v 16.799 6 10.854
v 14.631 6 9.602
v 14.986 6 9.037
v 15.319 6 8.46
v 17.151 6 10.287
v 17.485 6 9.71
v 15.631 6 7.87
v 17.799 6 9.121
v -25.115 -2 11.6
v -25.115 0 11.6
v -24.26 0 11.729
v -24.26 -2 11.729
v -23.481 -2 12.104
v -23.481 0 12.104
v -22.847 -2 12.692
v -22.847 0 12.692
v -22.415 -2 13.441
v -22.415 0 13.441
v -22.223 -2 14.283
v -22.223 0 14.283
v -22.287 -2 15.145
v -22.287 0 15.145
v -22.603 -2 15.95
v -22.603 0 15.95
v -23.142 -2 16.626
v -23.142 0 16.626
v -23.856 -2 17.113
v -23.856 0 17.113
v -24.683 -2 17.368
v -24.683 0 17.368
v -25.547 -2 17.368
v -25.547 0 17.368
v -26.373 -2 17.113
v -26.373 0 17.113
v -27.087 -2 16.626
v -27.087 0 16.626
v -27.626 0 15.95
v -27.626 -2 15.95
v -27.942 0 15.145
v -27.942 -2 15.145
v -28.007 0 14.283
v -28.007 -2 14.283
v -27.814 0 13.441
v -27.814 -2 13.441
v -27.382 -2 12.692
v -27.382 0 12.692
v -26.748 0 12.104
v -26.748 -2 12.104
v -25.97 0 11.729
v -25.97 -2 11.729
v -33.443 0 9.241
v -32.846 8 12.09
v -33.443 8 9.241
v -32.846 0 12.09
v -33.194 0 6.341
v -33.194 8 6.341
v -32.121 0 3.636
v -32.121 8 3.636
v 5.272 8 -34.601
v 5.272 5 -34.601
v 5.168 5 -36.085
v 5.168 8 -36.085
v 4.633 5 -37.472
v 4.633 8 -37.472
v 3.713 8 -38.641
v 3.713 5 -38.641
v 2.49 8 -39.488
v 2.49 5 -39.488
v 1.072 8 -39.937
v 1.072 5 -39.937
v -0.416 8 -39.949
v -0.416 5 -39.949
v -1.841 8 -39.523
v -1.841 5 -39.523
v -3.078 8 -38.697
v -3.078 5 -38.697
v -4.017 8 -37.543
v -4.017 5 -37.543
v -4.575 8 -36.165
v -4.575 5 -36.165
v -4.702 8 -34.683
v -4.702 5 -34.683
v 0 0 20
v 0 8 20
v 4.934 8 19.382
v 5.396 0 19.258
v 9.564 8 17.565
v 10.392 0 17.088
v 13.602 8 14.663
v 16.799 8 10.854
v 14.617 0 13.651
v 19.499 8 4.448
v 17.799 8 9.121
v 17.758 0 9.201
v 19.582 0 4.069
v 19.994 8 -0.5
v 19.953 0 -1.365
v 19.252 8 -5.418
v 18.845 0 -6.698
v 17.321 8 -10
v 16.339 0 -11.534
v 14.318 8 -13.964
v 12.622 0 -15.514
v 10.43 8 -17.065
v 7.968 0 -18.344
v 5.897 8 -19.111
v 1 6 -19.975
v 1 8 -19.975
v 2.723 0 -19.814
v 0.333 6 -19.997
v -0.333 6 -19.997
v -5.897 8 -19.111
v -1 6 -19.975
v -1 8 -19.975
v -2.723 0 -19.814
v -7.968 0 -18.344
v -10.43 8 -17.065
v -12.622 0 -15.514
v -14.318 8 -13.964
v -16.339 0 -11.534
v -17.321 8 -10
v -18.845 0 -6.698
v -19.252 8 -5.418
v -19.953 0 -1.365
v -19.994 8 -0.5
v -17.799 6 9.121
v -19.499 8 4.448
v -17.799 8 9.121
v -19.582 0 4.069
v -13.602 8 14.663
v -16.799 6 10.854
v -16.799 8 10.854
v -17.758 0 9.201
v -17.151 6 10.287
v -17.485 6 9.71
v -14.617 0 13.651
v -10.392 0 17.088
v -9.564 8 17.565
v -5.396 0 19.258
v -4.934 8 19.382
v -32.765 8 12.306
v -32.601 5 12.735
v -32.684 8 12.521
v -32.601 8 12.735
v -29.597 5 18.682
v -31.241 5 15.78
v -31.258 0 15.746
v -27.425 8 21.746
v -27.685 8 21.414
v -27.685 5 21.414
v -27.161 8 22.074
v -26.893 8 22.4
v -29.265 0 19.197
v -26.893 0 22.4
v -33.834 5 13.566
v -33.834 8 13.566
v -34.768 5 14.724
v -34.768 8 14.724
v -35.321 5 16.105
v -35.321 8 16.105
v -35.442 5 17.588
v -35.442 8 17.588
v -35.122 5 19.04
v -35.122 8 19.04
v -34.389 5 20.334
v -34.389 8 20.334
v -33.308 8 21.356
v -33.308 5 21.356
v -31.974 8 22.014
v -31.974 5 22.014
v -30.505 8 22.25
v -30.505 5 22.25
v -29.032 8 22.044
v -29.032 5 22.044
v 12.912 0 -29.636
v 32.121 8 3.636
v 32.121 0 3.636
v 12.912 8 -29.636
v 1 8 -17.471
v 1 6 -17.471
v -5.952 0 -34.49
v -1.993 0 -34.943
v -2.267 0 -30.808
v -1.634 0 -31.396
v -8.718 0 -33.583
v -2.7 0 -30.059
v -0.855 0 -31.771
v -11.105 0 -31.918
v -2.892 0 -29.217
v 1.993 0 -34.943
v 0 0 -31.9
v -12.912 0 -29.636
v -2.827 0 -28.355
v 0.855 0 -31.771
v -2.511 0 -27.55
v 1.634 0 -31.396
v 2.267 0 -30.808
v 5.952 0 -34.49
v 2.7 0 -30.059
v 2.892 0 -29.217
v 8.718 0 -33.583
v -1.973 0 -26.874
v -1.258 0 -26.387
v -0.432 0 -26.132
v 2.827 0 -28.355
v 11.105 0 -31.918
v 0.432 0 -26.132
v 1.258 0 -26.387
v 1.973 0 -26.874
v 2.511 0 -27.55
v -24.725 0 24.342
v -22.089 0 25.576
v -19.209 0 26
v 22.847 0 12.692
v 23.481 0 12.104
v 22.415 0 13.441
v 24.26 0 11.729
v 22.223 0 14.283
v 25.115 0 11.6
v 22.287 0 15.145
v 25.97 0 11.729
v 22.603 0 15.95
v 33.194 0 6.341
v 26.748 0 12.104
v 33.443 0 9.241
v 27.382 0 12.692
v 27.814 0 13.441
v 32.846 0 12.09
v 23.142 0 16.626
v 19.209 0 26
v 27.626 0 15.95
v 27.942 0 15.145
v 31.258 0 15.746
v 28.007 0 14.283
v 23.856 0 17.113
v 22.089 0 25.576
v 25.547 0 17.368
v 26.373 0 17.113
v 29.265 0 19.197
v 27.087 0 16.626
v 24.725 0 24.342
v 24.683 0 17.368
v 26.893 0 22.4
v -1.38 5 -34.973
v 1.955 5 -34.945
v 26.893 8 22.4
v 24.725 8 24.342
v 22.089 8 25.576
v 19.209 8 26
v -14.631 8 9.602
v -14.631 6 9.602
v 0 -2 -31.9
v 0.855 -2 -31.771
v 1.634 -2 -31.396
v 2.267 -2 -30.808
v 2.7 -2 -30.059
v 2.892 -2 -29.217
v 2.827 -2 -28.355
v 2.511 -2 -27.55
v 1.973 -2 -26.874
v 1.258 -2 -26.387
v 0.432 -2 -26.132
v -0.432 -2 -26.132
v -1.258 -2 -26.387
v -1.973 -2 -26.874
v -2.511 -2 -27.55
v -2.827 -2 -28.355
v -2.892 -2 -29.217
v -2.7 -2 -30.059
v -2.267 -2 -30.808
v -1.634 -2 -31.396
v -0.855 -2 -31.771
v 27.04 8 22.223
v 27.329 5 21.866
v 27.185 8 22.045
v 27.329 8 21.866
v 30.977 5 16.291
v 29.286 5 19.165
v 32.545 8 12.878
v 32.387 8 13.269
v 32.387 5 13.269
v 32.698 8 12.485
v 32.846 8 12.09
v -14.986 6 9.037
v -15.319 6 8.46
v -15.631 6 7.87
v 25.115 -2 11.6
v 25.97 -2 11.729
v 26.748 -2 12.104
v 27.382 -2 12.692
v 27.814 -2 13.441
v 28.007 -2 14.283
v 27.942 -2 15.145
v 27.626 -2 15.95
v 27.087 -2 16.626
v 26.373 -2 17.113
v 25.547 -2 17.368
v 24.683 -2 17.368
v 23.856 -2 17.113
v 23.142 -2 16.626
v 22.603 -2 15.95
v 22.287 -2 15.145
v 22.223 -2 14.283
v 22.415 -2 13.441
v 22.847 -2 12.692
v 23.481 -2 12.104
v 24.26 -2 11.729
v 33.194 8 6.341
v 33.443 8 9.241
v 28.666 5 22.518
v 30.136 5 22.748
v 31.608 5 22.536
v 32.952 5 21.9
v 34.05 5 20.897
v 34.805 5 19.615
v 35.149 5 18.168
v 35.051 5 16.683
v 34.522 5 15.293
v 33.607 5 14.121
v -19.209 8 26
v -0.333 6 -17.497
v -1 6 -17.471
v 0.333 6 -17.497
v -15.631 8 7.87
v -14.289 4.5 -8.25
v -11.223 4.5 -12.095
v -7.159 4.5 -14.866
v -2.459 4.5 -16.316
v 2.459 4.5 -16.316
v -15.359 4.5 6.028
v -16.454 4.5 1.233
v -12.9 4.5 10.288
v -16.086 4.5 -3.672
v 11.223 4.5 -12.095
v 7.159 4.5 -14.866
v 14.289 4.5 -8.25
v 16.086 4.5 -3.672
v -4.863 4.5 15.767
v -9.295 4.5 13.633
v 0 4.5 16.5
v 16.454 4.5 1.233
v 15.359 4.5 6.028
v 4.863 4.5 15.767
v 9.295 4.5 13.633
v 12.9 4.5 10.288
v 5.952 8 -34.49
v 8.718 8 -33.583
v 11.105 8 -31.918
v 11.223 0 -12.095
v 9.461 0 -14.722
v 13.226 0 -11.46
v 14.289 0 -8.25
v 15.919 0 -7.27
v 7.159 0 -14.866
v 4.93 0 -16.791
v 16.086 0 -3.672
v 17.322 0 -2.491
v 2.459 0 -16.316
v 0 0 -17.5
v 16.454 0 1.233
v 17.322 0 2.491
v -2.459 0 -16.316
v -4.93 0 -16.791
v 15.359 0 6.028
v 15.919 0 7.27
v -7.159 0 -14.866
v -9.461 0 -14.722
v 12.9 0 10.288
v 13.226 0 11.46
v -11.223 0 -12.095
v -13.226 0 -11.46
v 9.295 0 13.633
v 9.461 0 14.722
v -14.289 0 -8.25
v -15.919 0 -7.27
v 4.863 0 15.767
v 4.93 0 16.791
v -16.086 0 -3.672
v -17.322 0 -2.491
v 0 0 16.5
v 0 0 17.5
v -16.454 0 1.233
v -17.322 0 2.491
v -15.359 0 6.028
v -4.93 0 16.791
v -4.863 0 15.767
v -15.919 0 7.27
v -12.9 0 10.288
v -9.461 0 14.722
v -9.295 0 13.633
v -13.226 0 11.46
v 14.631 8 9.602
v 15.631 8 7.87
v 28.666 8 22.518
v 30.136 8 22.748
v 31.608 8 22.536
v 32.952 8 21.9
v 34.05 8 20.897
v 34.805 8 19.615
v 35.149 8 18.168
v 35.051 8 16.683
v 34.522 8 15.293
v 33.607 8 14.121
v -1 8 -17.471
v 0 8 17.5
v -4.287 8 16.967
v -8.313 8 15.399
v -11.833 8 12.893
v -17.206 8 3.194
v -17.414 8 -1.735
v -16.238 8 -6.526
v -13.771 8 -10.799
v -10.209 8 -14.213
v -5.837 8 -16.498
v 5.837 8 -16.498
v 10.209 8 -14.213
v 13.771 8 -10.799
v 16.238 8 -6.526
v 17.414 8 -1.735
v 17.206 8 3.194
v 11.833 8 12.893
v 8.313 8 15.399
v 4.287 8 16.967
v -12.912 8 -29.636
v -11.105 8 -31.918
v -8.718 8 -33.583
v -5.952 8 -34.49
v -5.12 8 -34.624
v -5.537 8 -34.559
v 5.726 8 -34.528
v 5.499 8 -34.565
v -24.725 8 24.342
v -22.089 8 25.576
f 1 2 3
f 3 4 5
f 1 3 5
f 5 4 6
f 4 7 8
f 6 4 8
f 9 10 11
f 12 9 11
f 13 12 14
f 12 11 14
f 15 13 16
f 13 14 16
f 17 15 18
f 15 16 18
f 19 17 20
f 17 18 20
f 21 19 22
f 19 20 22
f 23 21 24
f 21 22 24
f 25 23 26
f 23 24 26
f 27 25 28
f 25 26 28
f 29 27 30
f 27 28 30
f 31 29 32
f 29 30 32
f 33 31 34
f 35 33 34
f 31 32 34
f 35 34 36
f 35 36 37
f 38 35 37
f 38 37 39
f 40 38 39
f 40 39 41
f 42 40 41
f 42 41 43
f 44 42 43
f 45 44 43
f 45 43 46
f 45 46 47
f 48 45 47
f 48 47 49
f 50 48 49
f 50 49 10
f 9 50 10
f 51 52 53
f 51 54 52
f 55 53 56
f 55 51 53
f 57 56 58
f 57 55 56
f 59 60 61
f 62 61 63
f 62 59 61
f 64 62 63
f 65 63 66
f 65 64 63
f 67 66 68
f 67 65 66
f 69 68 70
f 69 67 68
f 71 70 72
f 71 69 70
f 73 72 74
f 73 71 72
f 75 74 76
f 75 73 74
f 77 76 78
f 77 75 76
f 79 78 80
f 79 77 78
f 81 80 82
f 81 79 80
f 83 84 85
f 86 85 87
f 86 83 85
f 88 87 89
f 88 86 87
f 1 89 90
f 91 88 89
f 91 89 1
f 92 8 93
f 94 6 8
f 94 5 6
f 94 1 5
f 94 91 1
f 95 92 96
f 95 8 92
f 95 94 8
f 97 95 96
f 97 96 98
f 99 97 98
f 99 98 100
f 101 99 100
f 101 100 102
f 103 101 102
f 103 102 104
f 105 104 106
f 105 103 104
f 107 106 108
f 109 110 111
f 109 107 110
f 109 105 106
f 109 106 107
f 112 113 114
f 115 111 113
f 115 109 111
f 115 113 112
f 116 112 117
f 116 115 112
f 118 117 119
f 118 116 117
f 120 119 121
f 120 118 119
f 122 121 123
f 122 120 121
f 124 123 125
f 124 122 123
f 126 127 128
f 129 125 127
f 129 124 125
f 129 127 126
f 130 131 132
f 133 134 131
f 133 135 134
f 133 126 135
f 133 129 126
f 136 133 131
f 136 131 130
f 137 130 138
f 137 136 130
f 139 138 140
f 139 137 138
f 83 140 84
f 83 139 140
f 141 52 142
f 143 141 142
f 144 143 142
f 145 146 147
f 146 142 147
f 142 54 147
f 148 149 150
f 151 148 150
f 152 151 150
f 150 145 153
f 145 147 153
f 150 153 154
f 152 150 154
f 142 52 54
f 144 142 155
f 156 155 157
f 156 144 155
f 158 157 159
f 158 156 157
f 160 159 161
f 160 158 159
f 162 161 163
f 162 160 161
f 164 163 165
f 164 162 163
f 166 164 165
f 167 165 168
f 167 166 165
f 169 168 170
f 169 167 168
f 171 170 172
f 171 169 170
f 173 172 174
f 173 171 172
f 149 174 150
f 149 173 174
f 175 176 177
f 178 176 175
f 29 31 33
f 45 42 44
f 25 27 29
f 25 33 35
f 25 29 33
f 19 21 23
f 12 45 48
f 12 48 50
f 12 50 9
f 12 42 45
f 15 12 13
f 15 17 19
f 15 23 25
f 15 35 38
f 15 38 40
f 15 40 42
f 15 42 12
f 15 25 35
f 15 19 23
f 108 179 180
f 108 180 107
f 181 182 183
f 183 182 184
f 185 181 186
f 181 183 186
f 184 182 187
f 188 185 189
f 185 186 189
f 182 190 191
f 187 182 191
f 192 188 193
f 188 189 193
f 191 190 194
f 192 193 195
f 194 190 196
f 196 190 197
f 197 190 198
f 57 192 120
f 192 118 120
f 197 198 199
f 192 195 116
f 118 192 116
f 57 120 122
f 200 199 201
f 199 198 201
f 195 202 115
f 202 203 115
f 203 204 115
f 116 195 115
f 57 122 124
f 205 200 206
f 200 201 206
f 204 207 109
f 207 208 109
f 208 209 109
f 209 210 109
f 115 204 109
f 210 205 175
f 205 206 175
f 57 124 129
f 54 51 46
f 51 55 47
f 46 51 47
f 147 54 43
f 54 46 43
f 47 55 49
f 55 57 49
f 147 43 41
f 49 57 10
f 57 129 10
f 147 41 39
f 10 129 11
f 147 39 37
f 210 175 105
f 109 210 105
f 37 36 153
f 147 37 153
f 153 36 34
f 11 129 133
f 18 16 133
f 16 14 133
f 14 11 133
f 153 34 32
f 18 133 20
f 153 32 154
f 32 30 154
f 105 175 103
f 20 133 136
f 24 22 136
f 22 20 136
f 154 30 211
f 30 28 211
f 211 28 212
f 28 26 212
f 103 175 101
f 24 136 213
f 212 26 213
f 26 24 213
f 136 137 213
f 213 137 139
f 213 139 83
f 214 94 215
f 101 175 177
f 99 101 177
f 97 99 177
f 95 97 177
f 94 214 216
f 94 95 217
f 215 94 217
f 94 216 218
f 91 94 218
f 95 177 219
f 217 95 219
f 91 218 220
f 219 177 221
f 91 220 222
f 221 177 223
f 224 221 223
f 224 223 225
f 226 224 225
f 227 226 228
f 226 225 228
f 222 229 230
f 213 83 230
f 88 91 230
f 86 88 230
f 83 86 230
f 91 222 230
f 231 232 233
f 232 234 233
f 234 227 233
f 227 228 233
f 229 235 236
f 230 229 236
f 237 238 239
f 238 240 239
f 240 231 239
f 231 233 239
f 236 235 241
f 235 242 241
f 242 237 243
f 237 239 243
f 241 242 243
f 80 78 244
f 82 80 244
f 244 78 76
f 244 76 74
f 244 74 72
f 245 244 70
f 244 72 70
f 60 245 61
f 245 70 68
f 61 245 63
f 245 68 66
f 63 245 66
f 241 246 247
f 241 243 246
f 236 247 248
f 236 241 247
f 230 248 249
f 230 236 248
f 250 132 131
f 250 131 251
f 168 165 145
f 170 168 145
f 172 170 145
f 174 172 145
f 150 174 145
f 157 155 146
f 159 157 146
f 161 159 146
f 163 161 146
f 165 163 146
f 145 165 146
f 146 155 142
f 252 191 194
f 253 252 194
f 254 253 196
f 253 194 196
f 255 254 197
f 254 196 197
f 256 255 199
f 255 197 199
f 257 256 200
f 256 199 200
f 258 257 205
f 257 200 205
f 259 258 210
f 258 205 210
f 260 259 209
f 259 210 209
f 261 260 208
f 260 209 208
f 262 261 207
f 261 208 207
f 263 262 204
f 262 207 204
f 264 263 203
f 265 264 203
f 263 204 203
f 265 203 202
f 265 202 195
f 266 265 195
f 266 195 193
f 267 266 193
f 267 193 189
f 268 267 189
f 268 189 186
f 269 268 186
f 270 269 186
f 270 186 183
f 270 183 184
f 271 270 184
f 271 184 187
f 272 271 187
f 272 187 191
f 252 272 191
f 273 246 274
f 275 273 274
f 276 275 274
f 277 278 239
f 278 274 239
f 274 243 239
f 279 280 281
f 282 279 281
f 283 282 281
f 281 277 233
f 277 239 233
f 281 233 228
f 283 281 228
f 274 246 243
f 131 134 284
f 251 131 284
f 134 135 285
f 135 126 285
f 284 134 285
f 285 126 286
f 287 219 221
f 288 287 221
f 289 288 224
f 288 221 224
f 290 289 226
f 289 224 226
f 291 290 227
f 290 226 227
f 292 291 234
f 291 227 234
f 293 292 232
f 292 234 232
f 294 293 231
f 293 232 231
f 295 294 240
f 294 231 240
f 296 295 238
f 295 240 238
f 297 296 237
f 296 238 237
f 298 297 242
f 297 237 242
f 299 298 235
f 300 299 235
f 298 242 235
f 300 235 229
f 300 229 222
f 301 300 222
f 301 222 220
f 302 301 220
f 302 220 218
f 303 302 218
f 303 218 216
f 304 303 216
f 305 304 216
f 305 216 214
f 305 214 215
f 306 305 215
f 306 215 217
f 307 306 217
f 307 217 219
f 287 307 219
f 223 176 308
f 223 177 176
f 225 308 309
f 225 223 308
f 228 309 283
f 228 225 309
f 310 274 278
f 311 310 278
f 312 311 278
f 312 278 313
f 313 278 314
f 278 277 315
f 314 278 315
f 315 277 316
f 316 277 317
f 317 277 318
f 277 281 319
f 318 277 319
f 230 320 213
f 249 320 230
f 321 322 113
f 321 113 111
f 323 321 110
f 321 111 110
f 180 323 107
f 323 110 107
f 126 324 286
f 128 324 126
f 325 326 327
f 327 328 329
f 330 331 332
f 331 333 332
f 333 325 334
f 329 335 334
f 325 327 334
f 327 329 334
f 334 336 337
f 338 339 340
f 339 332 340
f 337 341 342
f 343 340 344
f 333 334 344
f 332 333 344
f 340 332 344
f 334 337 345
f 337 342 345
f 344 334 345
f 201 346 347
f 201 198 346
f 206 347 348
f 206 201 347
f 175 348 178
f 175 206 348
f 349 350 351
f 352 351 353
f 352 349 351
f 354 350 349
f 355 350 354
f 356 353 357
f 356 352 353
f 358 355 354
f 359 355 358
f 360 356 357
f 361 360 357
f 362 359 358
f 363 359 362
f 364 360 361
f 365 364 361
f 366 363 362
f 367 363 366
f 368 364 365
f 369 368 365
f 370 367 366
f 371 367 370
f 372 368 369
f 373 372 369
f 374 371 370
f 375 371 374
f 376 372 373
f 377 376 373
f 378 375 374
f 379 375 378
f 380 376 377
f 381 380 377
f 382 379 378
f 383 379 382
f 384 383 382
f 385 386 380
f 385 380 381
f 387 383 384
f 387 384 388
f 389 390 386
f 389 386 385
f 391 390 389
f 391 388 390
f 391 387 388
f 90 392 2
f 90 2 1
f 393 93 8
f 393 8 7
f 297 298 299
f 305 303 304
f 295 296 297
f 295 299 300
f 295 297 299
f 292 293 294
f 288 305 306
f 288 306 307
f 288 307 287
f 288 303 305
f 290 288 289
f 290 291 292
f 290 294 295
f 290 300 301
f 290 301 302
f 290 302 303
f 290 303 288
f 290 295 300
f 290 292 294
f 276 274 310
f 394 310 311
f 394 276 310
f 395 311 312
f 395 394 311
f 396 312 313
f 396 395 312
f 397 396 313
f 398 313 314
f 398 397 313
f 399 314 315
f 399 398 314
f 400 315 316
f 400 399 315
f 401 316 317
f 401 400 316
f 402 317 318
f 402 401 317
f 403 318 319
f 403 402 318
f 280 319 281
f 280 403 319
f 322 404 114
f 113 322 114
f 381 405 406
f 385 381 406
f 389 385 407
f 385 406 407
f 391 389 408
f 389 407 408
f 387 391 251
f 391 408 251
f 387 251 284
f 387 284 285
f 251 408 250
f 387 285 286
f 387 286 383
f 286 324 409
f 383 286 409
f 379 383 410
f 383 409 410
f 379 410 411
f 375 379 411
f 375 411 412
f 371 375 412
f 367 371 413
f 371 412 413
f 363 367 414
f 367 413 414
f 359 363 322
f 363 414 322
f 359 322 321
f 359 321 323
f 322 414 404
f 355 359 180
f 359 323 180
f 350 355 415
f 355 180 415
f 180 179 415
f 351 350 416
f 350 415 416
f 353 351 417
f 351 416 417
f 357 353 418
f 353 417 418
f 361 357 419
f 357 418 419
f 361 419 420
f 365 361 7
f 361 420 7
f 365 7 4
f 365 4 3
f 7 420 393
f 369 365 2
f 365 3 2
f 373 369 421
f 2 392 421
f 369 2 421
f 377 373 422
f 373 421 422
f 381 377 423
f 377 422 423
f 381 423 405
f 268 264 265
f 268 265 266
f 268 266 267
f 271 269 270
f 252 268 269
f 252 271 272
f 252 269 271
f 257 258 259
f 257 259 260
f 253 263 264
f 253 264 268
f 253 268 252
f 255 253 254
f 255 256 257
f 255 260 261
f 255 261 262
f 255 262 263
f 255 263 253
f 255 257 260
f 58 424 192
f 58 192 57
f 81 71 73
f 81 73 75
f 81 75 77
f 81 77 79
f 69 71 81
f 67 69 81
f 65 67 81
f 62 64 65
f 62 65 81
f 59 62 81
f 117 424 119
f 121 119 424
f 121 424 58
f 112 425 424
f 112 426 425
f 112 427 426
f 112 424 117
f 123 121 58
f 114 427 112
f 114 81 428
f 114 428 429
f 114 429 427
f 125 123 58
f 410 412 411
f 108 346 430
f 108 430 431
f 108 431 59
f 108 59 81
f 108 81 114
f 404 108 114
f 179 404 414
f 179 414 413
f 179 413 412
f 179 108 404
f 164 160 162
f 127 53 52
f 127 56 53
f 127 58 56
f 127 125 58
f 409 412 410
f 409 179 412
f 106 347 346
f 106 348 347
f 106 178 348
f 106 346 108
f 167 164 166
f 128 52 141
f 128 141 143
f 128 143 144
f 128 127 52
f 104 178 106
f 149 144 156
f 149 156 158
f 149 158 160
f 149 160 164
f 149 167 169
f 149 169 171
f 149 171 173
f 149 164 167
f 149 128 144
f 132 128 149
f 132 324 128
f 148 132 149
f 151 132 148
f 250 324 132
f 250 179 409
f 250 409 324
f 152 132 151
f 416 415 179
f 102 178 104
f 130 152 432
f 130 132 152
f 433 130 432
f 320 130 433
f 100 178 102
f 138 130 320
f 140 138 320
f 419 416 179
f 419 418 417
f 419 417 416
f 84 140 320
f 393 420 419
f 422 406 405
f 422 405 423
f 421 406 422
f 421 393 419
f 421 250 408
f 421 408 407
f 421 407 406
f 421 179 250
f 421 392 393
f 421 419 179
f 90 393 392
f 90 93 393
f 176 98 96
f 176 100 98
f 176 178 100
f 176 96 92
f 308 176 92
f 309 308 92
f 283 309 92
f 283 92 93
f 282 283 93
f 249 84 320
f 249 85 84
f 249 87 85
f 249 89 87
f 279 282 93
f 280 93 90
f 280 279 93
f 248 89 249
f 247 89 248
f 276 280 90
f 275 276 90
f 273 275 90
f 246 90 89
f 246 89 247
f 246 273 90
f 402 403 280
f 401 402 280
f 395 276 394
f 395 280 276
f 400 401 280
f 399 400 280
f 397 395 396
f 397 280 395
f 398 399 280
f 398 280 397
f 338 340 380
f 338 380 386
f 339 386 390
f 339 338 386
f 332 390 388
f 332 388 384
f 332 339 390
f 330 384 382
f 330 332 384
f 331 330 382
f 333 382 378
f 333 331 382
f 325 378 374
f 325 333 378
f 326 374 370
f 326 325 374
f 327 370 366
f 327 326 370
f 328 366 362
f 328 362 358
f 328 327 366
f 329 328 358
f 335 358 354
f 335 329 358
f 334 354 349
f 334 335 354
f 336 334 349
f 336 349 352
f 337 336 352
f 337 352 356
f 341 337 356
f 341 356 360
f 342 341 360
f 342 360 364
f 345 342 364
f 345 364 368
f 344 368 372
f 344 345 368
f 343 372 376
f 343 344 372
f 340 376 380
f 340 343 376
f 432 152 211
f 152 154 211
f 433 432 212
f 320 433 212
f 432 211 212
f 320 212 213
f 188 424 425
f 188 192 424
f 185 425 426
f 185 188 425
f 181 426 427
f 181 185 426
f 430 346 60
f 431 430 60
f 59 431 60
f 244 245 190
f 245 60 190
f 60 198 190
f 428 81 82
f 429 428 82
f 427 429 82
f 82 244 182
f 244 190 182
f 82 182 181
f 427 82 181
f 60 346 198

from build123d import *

# Parameters (mm, degrees)
SKETCH1_R                = 20
BOSS_EXTRUDE1_DEPTH      = 3.5
SKETCH2_R                = 35
SKETCH2_R_2              = 20
SKETCH2_R_3              = 2.8
BOSS_EXTRUDE2_DEPTH      = 8
BOSS_EXTRUDE3_DEPTH      = 2
BOSS_EXTRUDE3_DEPTH_BACK = 8
SKETCH4_R                = 2.9
SKETCH5_R                = 5
BOSS_EXTRUDE4_DEPTH      = 3
CUT_EXTRUDE1_START       = -10
SKETCH3_R                = 20
CUT_EXTRUDE1_DEPTH       = 10
SKETCH9_R                = 17.5
BOSS_EXTRUDE5_DEPTH      = 3.5
SKETCH10_R               = 17.5
SKETCH10_R_2             = 16.5
BOSS_EXTRUDE6_DEPTH      = 4.5
SKETCH11_W               = 2
SKETCH11_H               = 6.599117057
BOSS_EXTRUDE7_DEPTH      = 2
SKETCH12_R               = 72.135852014
CUT_EXTRUDE2_DEPTH       = 22
FILLET1_R                = 10


with BuildPart() as part:
    # Sketch1 → Boss-Extrude1 (new body)
    with BuildSketch(Plane(origin=(0, 0, 0), x_dir=(1, 0, 0), z_dir=(0, 1, 0))):
        with Locations(Location((0, 0, 0), (0, 0, 270))):
            Circle(SKETCH1_R)
    extrude(amount=BOSS_EXTRUDE1_DEPTH)

    # Sketch2 → Boss-Extrude2 (add)
    with BuildSketch(Plane(origin=(0, 0, 0), x_dir=(1, 0, 0), z_dir=(0, 1, 0))):
        with Locations(Location((0, 0, 0), (0, 0, 270))):
            Circle(SKETCH2_R)
        with Locations(Location((0, 0, 0), (0, 0, 270))):
            Circle(SKETCH2_R_2, mode=Mode.SUBTRACT)
        with Locations(Location((0, 29, 0), (0, 0, 270))):
            Circle(SKETCH2_R_3, mode=Mode.SUBTRACT)
        with Locations(Location((25.11473671, -14.5, 0), (0, 0, 270))):
            Circle(SKETCH2_R_3, mode=Mode.SUBTRACT)
        with Locations(Location((-25.11473671, -14.5, 0), (0, 0, 270))):
            Circle(SKETCH2_R_3, mode=Mode.SUBTRACT)
    extrude(amount=BOSS_EXTRUDE2_DEPTH)

    # Sketch4 → Boss-Extrude3 (add, two sides: drawn at the far end of the back side and taken through both)
    with BuildSketch(Plane.XZ.offset(-BOSS_EXTRUDE3_DEPTH_BACK)):
        with Locations(Location((-25.11473671, 14.5, 0), (0, 0, 270))):
            Circle(SKETCH4_R)
        with Locations(Location((25.11473671, 14.5, 0), (0, 0, 270))):
            Circle(SKETCH4_R)
        with Locations(Location((0, -29, 0), (0, 0, 270))):
            Circle(SKETCH4_R)
    extrude(amount=BOSS_EXTRUDE3_DEPTH + BOSS_EXTRUDE3_DEPTH_BACK)

    # Sketch5 → Boss-Extrude4 (add)
    with BuildSketch(Plane(origin=(0, 8, 0), x_dir=(1, 0, 0), z_dir=(0, 1, 0))):
        with Locations((-30.453629482, -17.250404383)):
            Circle(SKETCH5_R)
        with Locations((0.28752632, 34.99881896)):
            Circle(SKETCH5_R)
        with Locations((30.166103162, -17.748414577)):
            Circle(SKETCH5_R)
    extrude(amount=-BOSS_EXTRUDE4_DEPTH)

    # Sketch3 → Cut-Extrude1 (cut)
    with BuildSketch(Plane(origin=(0, 3.5, 0), x_dir=(1, 0, 0), z_dir=(0, 1, 0)).offset(CUT_EXTRUDE1_START)):
        with Locations(Location((0, 0, 0), (0, 0, 270))):
            Circle(SKETCH3_R)
    extrude(amount=CUT_EXTRUDE1_DEPTH, mode=Mode.SUBTRACT)



with BuildPart() as body_2:
    # Sketch9 → Boss-Extrude5 (new body)
    with BuildSketch(Plane(origin=(0, 8, 0), x_dir=(1, 0, 0), z_dir=(0, 1, 0))):
        with Locations(Location((0, 0, 0), (0, 0, 270))):
            Circle(SKETCH9_R)
    extrude(amount=-BOSS_EXTRUDE5_DEPTH)

    # Sketch10 → Boss-Extrude6 (add)
    with BuildSketch(Plane(origin=(0, 4.5, 0), x_dir=(-1, 0, 0), z_dir=(0, -1, 0))):
        with Locations(Location((0, 0, 0), (0, 0, 270))):
            Circle(SKETCH10_R)
        with Locations(Location((0, 0, 0), (0, 0, 270))):
            Circle(SKETCH10_R_2, mode=Mode.SUBTRACT)
    extrude(amount=BOSS_EXTRUDE6_DEPTH)


with BuildPart() as part_1:
    add(part.part)

    add(body_2.part)  # Boss-Extrude7 merges body 2
    # Sketch11 → Boss-Extrude7 (add)
    with BuildSketch(Plane(origin=(0, 8, 0), x_dir=(1, 0, 0), z_dir=(0, 1, 0))):
        Polygon((19.946286756, -10.36129349), (14.231283742, -7.061734961), (13.231283742, -8.793785769), (18.946286756, -12.093344297), align=None)
        with Locations((0, 19.155079259)):
            Rectangle(SKETCH11_W, SKETCH11_H)
        Polygon((-18.946286756, -12.093344297), (-13.231283742, -8.793785769), (-14.231283742, -7.061734961), (-19.946286756, -10.36129349), align=None)
    extrude(amount=-BOSS_EXTRUDE7_DEPTH)

    # Sketch12 → Cut-Extrude2 (cut)
    with BuildSketch(Plane(origin=(0, 8, 0), x_dir=(1, 0, 0), z_dir=(0, 1, 0))):
        Circle(SKETCH12_R)
        Polygon((0, 52), (-45.033320997, -26), (45.033320997, -26), align=None, mode=Mode.SUBTRACT)
    extrude(amount=-CUT_EXTRUDE2_DEPTH, mode=Mode.SUBTRACT)

    # Fillet1
    fillet1_edges = [part_1.edges().sort_by_distance(p)[0] for p in [
        (34.232035012, 4, 7.291623888),
        (10.801285985, 4, -33.291623888),
        (-23.430749028, 4, 26),
        (23.430749028, 4, 26),
        (-10.801285985, 4, -33.291623888),
        (-34.232035012, 4, 7.291623888),
    ]]
    fillet(fillet1_edges, radius=FILLET1_R)


solid = part_1.part
